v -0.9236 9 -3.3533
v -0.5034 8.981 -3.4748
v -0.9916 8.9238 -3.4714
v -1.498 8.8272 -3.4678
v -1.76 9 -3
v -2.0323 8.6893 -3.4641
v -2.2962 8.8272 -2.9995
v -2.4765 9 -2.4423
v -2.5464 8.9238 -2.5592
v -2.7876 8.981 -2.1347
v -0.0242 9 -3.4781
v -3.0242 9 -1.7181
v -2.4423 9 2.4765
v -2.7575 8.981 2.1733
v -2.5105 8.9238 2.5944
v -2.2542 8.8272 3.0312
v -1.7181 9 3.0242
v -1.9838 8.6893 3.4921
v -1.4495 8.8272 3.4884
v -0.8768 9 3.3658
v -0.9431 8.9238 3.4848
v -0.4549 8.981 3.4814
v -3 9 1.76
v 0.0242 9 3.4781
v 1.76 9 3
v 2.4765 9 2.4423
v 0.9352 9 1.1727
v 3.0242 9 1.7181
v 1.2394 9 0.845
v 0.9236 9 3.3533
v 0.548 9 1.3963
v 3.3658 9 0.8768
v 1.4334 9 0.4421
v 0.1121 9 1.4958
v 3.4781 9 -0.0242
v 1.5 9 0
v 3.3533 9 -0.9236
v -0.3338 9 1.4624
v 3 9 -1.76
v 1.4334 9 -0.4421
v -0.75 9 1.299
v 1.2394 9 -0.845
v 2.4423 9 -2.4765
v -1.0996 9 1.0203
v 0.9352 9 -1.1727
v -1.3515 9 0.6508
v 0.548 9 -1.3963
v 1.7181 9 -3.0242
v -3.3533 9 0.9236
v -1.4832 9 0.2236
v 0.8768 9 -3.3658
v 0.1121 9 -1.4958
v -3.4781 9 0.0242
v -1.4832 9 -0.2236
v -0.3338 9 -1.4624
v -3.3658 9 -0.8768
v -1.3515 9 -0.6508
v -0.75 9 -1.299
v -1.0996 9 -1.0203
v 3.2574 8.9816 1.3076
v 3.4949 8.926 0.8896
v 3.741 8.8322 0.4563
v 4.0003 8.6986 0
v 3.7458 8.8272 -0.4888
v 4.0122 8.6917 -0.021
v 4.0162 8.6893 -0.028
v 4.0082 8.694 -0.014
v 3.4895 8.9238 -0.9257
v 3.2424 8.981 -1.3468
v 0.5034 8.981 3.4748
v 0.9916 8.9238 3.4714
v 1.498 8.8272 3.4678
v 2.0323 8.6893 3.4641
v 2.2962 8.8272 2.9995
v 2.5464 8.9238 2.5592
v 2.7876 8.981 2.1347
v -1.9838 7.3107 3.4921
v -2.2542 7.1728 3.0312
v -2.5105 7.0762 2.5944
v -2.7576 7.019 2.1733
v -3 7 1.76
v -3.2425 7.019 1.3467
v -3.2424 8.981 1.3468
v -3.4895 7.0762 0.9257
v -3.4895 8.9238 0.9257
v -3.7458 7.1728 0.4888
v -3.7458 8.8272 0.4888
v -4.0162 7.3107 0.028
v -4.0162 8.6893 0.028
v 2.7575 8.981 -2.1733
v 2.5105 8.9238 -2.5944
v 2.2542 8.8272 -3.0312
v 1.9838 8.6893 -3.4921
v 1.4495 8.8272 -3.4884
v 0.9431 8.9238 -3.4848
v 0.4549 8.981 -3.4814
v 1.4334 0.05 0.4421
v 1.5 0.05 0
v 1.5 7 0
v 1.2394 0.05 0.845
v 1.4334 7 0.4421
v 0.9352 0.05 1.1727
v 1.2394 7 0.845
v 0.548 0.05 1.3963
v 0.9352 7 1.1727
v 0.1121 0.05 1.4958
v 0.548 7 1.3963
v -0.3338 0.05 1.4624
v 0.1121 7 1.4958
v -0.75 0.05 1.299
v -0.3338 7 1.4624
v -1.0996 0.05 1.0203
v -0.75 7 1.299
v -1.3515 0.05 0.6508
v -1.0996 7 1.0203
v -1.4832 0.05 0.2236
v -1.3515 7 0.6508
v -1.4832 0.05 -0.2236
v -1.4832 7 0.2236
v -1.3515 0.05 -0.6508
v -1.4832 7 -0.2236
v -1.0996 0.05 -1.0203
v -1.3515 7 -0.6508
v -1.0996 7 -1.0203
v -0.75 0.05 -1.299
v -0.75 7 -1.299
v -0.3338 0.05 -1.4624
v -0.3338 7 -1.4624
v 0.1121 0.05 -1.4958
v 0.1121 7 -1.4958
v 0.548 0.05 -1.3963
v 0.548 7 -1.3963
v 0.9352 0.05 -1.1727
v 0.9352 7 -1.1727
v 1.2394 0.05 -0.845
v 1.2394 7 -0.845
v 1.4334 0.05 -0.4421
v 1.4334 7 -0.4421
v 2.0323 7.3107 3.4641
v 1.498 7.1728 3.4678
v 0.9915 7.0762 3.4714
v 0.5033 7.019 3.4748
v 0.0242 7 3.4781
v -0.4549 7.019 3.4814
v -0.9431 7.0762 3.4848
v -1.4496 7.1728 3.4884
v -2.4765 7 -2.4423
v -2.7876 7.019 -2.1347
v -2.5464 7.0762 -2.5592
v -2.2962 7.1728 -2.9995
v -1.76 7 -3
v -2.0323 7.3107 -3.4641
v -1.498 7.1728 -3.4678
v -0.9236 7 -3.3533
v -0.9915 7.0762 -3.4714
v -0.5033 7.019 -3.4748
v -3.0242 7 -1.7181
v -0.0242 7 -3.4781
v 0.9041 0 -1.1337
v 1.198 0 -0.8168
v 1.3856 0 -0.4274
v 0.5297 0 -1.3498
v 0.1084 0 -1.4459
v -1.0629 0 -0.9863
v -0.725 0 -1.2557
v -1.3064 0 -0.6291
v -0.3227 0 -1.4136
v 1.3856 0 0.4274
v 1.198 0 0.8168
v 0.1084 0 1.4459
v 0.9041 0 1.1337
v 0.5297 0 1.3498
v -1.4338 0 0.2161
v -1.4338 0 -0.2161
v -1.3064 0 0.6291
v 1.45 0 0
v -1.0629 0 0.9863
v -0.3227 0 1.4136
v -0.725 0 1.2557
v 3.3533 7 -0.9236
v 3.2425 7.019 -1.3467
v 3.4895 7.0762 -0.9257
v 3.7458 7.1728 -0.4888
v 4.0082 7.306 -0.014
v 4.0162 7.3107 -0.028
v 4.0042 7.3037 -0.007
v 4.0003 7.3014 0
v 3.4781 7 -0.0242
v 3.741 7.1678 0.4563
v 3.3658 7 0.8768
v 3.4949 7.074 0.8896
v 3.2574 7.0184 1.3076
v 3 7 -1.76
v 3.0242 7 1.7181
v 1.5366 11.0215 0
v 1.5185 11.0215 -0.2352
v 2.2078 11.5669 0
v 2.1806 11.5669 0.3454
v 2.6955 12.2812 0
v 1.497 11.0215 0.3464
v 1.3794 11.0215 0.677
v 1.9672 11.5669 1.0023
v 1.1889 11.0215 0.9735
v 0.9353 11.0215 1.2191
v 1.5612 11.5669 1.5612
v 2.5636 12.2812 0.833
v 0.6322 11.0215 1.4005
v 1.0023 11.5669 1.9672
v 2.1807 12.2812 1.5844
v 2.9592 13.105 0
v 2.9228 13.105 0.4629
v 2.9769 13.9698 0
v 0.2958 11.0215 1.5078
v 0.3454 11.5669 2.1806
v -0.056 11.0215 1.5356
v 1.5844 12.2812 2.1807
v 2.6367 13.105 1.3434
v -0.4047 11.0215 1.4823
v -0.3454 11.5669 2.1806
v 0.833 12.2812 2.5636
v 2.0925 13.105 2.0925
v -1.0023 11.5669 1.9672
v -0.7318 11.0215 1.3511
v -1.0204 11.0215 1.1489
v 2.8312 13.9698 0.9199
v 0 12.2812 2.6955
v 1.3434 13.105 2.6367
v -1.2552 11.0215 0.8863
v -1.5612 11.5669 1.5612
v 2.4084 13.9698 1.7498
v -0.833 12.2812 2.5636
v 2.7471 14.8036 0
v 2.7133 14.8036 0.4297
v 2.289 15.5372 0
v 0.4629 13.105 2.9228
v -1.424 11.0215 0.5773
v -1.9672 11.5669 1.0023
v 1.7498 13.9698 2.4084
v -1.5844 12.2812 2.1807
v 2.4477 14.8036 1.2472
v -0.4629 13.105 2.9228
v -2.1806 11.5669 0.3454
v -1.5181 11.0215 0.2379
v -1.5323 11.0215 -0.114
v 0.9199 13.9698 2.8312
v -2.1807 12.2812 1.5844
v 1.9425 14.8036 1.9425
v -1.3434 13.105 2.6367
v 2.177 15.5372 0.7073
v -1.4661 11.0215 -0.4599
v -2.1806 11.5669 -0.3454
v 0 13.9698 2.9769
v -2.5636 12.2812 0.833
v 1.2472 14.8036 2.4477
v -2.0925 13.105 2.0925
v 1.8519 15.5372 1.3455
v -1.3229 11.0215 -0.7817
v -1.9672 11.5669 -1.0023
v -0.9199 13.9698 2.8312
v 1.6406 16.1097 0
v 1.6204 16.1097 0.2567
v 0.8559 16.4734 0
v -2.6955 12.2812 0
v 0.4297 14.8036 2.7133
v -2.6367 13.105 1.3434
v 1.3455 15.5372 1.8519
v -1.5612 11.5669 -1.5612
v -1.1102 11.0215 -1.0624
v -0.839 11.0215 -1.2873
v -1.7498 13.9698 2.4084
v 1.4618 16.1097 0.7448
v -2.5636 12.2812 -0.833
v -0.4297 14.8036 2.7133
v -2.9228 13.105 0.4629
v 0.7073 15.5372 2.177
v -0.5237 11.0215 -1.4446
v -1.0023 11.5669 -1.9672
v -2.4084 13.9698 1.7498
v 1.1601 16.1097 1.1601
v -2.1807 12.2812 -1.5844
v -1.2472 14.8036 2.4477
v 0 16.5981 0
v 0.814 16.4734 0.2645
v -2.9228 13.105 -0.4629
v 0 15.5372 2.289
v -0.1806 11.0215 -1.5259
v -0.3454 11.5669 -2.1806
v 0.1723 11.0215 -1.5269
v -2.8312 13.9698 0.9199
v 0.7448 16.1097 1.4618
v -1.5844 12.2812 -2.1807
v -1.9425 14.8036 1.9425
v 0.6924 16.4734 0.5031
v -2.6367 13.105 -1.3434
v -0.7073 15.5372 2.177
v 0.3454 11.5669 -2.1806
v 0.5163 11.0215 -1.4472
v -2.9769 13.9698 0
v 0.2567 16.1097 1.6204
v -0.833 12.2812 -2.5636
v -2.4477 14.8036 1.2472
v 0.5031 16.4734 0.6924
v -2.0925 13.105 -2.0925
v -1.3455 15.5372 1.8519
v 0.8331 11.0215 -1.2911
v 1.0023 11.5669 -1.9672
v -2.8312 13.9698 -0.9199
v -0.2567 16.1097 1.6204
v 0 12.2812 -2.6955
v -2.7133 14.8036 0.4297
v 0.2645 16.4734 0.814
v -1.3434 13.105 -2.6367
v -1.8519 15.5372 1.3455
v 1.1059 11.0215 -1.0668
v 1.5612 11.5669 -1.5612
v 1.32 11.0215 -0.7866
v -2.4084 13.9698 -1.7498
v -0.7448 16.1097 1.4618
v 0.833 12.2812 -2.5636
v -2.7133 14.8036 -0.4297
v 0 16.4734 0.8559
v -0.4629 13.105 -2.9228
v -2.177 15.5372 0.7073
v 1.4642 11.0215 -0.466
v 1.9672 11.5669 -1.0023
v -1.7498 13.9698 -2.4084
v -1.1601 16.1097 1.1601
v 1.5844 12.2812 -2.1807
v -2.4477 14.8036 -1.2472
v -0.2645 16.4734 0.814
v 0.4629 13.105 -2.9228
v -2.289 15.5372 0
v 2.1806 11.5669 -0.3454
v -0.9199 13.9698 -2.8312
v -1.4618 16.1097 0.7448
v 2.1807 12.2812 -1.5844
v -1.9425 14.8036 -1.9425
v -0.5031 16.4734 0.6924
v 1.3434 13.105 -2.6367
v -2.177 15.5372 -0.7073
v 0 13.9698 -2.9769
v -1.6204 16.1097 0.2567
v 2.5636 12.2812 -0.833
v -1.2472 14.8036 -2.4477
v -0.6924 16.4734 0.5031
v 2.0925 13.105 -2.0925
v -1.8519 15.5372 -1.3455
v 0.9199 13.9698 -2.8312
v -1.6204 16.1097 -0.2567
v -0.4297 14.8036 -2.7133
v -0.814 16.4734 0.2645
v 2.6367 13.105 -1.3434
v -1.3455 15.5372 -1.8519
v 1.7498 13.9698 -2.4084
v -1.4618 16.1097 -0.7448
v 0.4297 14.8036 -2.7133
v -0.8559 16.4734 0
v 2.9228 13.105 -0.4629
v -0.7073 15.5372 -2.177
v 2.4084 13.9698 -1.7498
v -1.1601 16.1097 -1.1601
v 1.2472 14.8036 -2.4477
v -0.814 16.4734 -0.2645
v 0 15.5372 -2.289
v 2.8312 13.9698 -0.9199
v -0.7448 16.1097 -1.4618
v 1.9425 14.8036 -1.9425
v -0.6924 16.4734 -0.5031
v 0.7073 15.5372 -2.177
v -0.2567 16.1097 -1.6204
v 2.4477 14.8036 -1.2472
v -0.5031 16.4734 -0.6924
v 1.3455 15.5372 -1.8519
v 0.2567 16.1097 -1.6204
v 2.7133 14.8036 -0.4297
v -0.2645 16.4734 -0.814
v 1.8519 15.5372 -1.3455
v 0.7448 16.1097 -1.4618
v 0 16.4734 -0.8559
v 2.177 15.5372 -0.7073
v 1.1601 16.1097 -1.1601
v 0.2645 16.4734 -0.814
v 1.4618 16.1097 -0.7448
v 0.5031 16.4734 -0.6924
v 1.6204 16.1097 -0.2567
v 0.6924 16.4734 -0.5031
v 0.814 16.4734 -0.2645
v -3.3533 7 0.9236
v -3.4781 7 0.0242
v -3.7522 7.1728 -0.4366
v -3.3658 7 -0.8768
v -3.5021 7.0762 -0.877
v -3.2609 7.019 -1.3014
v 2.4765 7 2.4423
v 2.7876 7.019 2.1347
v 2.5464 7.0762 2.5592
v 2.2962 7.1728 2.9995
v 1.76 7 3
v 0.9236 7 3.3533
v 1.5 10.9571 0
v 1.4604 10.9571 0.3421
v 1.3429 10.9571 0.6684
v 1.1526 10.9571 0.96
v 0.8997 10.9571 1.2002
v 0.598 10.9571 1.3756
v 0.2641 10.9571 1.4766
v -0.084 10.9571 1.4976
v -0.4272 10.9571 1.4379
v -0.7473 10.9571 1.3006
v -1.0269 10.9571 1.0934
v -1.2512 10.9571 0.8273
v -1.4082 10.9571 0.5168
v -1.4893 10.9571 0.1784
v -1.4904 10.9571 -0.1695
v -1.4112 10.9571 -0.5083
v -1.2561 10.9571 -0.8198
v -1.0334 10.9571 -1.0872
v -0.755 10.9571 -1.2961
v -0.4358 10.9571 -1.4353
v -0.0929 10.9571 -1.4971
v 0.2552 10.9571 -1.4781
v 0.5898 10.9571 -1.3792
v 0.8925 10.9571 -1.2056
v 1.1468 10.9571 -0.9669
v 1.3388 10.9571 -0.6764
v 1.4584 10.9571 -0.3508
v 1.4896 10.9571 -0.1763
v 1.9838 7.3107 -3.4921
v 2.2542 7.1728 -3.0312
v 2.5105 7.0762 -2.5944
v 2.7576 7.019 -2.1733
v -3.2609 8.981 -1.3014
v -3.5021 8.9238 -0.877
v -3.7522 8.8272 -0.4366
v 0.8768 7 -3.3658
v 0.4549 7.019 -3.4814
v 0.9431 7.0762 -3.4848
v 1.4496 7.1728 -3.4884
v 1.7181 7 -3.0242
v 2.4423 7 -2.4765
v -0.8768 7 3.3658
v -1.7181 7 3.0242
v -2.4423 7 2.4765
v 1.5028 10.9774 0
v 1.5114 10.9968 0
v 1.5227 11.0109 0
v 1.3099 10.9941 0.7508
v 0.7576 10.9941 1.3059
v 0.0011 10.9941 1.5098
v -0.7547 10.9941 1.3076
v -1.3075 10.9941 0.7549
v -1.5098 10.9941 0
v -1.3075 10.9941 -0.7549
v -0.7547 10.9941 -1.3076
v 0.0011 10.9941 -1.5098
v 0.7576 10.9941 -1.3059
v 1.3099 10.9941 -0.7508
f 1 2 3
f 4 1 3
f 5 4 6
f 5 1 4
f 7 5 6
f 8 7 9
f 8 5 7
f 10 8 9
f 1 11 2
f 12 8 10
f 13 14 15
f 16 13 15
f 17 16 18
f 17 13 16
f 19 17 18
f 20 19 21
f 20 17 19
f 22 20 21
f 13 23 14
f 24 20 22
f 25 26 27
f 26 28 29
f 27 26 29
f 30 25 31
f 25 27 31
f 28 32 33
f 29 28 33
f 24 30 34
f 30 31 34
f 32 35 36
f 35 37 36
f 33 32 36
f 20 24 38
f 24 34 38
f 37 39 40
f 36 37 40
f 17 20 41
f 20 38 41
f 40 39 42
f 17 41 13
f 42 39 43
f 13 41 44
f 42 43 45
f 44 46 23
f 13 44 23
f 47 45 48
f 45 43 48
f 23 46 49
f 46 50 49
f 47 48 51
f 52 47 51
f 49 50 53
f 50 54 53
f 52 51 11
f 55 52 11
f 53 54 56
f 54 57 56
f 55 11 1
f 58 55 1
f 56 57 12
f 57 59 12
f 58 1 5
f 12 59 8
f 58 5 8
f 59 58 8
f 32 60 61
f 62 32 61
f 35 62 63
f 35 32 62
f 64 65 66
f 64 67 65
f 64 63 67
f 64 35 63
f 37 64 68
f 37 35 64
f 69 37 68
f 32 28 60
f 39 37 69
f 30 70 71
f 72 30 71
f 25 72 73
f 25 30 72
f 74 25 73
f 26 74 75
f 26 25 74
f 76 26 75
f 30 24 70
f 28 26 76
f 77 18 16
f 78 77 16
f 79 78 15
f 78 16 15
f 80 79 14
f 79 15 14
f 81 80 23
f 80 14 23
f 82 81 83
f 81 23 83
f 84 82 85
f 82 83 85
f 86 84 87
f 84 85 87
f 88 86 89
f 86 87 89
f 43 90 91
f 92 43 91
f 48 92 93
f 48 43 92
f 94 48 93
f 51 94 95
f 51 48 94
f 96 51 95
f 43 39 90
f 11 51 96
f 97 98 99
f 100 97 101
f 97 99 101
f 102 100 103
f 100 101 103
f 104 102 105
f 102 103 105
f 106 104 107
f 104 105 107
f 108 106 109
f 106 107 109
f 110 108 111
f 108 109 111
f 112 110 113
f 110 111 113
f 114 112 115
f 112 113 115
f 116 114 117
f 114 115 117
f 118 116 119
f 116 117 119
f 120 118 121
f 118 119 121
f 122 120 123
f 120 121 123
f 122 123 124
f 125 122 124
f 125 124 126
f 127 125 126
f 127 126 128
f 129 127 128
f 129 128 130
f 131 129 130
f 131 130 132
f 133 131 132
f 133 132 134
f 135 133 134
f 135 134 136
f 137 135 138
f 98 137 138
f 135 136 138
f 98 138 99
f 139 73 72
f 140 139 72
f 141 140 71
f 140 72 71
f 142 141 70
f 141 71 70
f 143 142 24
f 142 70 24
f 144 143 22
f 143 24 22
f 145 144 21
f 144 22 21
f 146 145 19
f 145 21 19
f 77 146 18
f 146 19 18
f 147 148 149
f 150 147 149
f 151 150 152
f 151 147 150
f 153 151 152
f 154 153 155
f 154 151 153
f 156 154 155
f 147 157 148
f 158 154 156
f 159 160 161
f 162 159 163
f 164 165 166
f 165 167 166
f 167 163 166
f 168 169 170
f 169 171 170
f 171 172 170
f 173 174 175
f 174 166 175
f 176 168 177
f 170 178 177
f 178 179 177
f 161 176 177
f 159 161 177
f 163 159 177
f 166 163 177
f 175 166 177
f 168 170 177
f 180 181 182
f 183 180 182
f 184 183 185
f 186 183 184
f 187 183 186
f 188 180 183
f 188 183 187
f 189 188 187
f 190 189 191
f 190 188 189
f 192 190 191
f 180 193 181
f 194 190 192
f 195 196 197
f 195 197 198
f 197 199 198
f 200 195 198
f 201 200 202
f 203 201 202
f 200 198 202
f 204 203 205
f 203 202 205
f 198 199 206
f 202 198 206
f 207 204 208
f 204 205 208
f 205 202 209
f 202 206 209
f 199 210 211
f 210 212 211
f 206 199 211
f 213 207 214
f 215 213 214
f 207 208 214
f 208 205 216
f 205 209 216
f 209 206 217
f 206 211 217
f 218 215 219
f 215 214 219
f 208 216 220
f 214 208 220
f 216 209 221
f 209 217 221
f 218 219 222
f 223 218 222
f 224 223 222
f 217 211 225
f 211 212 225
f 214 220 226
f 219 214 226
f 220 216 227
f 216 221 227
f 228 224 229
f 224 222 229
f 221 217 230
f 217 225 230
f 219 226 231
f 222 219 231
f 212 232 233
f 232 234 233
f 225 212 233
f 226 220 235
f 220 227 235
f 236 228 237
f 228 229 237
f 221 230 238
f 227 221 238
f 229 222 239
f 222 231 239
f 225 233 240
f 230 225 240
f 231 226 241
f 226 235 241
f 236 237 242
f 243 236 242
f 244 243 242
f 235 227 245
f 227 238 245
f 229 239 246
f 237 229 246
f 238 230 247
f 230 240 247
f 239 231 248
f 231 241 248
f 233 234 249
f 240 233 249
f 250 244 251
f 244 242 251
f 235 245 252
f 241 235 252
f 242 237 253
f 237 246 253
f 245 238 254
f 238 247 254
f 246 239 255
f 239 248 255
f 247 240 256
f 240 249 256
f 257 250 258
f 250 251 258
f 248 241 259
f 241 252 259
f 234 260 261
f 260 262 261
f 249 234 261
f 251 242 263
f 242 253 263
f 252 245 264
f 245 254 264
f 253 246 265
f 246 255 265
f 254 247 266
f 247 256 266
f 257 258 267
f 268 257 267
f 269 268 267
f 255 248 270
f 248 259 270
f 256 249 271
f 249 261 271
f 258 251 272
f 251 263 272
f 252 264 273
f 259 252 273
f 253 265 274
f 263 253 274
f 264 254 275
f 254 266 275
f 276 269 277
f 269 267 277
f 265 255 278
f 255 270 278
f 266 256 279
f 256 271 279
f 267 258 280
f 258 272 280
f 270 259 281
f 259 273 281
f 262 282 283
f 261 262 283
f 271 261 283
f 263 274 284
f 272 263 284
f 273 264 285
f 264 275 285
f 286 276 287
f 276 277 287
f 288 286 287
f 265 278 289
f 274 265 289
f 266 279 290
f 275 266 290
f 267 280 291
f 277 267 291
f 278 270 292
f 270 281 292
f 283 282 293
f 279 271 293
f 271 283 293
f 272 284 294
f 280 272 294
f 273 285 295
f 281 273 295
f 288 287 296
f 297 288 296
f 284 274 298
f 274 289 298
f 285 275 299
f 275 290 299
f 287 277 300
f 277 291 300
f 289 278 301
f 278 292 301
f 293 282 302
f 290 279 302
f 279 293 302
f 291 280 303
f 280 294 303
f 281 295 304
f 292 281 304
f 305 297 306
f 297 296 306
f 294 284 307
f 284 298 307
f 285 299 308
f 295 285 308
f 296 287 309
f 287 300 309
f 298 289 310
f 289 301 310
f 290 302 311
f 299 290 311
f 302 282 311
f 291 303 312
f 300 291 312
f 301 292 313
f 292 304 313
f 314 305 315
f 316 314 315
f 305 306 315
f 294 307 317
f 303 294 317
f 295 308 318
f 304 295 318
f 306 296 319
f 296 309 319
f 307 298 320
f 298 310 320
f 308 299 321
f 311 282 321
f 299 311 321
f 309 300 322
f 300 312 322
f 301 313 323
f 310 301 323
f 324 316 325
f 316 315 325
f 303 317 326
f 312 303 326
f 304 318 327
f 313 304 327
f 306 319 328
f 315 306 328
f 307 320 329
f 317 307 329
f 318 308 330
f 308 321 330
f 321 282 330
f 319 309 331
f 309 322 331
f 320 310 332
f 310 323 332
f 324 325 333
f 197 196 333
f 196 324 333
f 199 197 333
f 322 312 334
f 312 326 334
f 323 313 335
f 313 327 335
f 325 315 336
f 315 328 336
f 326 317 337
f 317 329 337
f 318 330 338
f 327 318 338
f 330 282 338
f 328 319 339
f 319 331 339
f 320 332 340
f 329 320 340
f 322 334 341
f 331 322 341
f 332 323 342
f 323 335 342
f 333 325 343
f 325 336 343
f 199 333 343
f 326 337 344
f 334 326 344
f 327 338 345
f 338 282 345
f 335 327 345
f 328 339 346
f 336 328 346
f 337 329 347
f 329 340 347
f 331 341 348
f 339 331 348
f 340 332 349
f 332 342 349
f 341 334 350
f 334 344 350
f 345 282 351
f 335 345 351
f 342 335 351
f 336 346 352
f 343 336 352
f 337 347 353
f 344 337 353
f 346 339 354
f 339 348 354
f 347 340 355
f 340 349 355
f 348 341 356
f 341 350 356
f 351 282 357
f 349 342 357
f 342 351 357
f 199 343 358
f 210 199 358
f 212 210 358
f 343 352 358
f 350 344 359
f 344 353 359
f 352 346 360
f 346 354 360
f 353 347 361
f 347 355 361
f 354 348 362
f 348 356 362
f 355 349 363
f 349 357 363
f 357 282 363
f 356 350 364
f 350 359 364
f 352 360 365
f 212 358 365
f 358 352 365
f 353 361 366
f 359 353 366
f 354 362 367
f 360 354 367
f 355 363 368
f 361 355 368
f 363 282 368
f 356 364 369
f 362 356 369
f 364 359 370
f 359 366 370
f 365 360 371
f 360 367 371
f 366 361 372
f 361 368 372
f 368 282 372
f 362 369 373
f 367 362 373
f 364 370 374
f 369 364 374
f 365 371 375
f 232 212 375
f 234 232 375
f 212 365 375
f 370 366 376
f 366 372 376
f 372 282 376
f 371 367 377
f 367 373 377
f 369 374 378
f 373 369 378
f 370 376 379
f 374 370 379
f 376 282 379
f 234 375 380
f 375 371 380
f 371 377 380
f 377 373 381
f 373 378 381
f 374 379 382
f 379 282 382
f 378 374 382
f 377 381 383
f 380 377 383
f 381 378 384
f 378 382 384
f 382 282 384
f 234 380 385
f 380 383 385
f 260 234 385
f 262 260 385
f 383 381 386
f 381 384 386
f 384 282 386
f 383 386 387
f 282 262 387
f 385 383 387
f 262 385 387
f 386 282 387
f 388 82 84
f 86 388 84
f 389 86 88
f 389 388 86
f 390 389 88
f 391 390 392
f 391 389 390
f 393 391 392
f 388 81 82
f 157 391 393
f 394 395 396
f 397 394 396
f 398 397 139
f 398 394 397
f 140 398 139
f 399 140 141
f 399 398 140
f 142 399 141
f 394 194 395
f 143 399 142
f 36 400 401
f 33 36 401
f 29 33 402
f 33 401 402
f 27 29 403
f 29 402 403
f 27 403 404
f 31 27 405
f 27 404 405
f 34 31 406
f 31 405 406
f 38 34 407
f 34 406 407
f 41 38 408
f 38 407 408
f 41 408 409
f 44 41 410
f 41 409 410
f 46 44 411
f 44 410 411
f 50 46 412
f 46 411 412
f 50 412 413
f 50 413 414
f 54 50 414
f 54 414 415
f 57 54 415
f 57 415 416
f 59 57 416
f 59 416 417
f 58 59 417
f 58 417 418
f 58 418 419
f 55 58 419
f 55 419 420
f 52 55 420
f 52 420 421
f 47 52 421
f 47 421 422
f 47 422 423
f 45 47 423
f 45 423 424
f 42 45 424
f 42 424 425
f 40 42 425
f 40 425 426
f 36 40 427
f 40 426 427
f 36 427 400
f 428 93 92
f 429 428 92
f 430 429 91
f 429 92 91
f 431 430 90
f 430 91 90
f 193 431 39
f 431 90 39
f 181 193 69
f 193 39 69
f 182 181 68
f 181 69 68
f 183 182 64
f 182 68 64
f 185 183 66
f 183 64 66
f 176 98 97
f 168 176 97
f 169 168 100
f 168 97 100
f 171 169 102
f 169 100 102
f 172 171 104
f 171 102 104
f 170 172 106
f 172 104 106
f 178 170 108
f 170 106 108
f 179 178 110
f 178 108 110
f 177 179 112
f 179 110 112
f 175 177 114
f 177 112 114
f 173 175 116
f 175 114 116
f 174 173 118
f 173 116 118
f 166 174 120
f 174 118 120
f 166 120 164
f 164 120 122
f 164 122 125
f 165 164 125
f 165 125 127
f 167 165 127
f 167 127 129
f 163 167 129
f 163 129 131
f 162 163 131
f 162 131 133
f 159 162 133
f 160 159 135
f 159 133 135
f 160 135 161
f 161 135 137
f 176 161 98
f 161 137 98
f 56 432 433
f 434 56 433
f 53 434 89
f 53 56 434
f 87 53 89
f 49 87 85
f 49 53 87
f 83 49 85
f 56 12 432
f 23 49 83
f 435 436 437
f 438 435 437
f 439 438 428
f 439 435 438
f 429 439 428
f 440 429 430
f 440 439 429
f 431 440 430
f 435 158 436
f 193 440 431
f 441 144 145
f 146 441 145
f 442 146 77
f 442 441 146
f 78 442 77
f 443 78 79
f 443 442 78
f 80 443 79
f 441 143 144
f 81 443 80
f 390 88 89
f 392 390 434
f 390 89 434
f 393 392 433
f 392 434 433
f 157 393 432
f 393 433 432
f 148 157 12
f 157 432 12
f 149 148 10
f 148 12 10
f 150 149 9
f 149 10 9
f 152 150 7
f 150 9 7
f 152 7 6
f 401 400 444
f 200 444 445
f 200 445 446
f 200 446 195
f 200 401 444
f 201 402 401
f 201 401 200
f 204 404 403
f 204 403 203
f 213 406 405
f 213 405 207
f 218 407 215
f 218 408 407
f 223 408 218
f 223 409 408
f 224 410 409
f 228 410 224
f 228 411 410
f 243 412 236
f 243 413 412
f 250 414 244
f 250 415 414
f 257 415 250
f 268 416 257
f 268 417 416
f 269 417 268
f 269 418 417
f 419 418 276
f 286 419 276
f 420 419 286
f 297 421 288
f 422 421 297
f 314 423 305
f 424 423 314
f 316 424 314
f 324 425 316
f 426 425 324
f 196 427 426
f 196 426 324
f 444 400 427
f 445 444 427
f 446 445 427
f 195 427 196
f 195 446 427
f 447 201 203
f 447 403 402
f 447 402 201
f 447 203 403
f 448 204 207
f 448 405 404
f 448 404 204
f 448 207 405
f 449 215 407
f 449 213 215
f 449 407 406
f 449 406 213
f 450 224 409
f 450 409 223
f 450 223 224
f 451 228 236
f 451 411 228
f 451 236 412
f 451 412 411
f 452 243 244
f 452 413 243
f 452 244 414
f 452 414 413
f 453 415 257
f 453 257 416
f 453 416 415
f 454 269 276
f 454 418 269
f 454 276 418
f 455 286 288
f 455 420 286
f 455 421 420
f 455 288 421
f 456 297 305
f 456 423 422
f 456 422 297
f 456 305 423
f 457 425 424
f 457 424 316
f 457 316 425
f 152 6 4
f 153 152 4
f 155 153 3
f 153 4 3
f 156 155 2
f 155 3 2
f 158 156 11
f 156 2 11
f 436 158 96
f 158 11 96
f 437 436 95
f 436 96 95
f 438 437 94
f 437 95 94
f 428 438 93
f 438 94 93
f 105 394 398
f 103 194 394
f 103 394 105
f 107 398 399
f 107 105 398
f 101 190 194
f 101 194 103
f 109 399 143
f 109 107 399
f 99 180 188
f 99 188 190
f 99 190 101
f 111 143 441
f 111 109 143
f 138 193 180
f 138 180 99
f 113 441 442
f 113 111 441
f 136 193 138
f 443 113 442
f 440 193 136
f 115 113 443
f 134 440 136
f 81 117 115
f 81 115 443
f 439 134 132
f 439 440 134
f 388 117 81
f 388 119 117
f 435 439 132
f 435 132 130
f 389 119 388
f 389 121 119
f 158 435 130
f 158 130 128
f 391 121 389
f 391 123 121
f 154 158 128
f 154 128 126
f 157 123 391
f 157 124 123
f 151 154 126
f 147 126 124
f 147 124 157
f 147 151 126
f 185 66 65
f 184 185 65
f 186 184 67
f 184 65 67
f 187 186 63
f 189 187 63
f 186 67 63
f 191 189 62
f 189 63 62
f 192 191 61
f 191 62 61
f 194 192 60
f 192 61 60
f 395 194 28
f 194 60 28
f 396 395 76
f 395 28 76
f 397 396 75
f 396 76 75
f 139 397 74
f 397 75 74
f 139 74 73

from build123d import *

# Parameters (mm, degrees)
CHAMFER1_SIZE       = 0.05
BOSS_EXTRUDE1_START = -2
SKETCH4_R           = 1.5
BOSS_EXTRUDE1_DEPTH = 2
SKETCH5_OUTSIDE_W   = 20.904
SKETCH5_OUTSIDE_H   = 19.856
SKETCH5_OUTSIDE_R   = 3.478175124
CUT_EXTRUDE2_DEPTH  = 2
CUT_EXTRUDE2_DRAFT  = -60
SKETCH6_OUTSIDE_W   = 20.904
SKETCH6_OUTSIDE_H   = 19.856
SKETCH6_OUTSIDE_R   = 3.478175124
CUT_EXTRUDE3_DEPTH  = 2
CUT_EXTRUDE3_DRAFT  = -60
FILLET1_R           = 0.075


with BuildPart() as part:
    # Sketch1 → Revolve1 (revolve)
    with BuildSketch(Plane.XY):
        with BuildLine():
            Line((0, 16.598076211), (0, 0))
            Line((0, 0), (1.5, 0))
            Line((1.5, 0), (1.5, 11))
            ThreePointArc((1.5, 11), (2.897777479, 14.374533347), (0, 16.598076211))
        make_face()
    revolve(axis=Axis((0, 16.598076211, 0), (0, -1, 0)))

    # Chamfer1
    chamfer1_edges = [part.edges().sort_by_distance(p)[0] for p in [
        (-1.5, 0, 0),
    ]]
    chamfer(chamfer1_edges, length=CHAMFER1_SIZE)

    # Sketch4 → Boss-Extrude1 (add)
    with BuildSketch(Plane(origin=(0, 7, 0), x_dir=(-1, 0, 0), z_dir=(0, -1, 0)).offset(BOSS_EXTRUDE1_START)):
        Polygon((1.983846765, -3.492079839), (4.016153235, -0.027978224), (2.032306471, 3.464101615), (-1.983846765, 3.492079839), (-4.016153235, 0.027978224), (-2.032306471, -3.464101615), align=None)
        with Locations(Location((0, 0, 0), (0, 0, 270))):
            Circle(SKETCH4_R, mode=Mode.SUBTRACT)
    extrude(amount=BOSS_EXTRUDE1_DEPTH)


with BuildPart() as cut_extrude2_tool:
    # Sketch5 outside → Cut-Extrude2 (with draft: the straight prism first)
    with BuildSketch(Plane.XZ.offset(-7)):
        Rectangle(SKETCH5_OUTSIDE_W, SKETCH5_OUTSIDE_H)
        Circle(SKETCH5_OUTSIDE_R, mode=Mode.SUBTRACT)
    extrude(amount=-CUT_EXTRUDE2_DEPTH)
    # Cut-Extrude2: the draft: its side faces are tilted about the plane it starts from
    cut_extrude2_sides = [cut_extrude2_tool.faces().sort_by_distance(p)[0] for p in [
        (0, 8, -9.928),
        (10.452, 8, 0),
        (0, 8, 9.928),
        (-10.452, 8, 0),
        (-3.478175124, 8, 0),
    ]]
    draft(cut_extrude2_sides, Plane.XZ.offset(-7), CUT_EXTRUDE2_DRAFT)


with BuildPart() as part_1:
    add(part.part)

    # Cut-Extrude2: cut by cut_extrude2_tool
    add(cut_extrude2_tool.part, mode=Mode.SUBTRACT)


with BuildPart() as cut_extrude3_tool:
    # Sketch6 outside → Cut-Extrude3 (with draft: the straight prism first)
    with BuildSketch(Plane(origin=(0, 9, 0), x_dir=(1, 0, 0), z_dir=(0, 1, 0))):
        Rectangle(SKETCH6_OUTSIDE_W, SKETCH6_OUTSIDE_H)
        Circle(SKETCH6_OUTSIDE_R, mode=Mode.SUBTRACT)
    extrude(amount=-CUT_EXTRUDE3_DEPTH)
    # Cut-Extrude3: the draft: its side faces are tilted about the plane it starts from
    cut_extrude3_sides = [cut_extrude3_tool.faces().sort_by_distance(p)[0] for p in [
        (0, 8, 9.928),
        (10.452, 8, 0),
        (0, 8, -9.928),
        (-10.452, 8, 0),
        (-3.478175124, 8, 0),
    ]]
    draft(cut_extrude3_sides, Plane(origin=(0, 9, 0), x_dir=(1, 0, 0), z_dir=(0, 1, 0)), CUT_EXTRUDE3_DRAFT)


with BuildPart() as part_2:
    add(part_1.part)

    # Cut-Extrude3: cut by cut_extrude3_tool
    add(cut_extrude3_tool.part, mode=Mode.SUBTRACT)

    # Fillet1
    fillet1_edges = [part_2.edges().sort_by_distance(p)[0] for p in [
        (-1.5, 11, 0),
    ]]
    fillet(fillet1_edges, radius=FILLET1_R)


solid = part_2.part
